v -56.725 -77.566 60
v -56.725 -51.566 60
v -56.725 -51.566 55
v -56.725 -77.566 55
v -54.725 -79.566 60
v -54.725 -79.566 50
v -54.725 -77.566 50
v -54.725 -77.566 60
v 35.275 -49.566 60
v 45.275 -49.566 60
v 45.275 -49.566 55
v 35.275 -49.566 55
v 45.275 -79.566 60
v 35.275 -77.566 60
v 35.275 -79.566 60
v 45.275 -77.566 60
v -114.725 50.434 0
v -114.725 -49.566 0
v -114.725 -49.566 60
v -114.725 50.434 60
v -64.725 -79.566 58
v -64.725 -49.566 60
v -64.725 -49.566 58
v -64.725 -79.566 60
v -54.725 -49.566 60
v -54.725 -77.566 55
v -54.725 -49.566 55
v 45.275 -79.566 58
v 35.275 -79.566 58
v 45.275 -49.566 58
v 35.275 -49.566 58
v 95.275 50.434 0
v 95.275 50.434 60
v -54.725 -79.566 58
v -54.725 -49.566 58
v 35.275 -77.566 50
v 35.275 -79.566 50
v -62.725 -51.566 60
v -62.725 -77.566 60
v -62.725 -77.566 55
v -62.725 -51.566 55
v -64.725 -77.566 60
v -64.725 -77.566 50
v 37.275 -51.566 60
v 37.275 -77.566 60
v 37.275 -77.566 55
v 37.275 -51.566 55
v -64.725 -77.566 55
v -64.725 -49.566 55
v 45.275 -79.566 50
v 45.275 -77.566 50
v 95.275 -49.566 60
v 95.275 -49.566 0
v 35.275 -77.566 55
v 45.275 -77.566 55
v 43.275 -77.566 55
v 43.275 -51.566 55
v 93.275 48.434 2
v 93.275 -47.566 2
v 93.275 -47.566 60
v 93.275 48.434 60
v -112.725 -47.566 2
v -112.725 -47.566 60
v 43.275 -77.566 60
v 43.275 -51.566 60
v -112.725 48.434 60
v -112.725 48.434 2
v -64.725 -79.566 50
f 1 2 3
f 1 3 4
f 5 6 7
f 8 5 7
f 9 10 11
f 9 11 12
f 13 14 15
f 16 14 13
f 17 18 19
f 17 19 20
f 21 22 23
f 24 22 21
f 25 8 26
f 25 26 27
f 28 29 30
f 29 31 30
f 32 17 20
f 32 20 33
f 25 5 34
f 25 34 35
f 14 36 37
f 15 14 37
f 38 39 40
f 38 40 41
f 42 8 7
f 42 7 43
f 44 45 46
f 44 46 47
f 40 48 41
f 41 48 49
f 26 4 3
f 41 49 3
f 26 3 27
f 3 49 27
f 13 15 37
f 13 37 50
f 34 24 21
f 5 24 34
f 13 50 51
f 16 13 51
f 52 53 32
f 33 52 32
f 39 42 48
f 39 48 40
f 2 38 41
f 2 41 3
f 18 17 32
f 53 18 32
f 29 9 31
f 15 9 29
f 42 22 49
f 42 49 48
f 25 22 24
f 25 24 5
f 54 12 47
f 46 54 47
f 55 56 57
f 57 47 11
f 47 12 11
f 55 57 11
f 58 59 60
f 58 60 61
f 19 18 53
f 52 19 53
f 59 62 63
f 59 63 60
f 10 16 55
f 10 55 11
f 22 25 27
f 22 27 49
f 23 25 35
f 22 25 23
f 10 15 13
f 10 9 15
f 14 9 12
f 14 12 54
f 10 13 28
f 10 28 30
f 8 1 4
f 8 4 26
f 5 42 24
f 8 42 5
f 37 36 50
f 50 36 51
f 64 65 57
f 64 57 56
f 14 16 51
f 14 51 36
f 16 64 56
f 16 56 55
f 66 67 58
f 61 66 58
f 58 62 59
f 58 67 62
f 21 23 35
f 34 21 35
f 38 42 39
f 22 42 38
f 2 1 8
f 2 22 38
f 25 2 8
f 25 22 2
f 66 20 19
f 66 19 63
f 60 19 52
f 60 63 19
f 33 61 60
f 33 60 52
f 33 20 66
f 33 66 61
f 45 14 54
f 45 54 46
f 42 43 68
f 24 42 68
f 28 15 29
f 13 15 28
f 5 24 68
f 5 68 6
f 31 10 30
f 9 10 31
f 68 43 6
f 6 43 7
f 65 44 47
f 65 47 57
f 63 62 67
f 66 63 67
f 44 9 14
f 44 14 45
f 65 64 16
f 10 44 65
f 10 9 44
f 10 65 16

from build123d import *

# Parameters (mm, degrees)
F0_W     = 210
F0_H     = 100
F0_W_2   = 206
F0_H_2   = 96
F1_DEPTH = 2
F2_DEPTH = 60
F4_W     = 6
F4_H     = 26
F5_DEPTH = 2
F6_DEPTH = 10
F7_DEPTH = 5


with BuildPart() as f1:
    # F0 (on Top) → F1 (new body)
    with BuildSketch(Plane.XY):
        with Locations((-9.7246277332, 0.4339471459)):
            Rectangle(F0_W, F0_H)
        with Locations((-9.7246277332, 0.4339471459)):
            Rectangle(F0_W_2, F0_H_2, mode=Mode.SUBTRACT)
        with Locations((-9.7246277332, 0.4339471459)):
            Rectangle(F0_W_2, F0_H_2)
    extrude(amount=F1_DEPTH)

    # F0 (on Top) → F2 (join)
    with BuildSketch(Plane.XY):
        with Locations((-9.7246277332, 0.4339471459)):
            Rectangle(F0_W, F0_H)
        with Locations((-9.7246277332, 0.4339471459)):
            Rectangle(F0_W_2, F0_H_2, mode=Mode.SUBTRACT)
    extrude(amount=F2_DEPTH)


with BuildPart() as f5:
    # F4 (on face) → F5 (new body)
    with BuildSketch(Plane.XY.offset(60)):
        Polygon((-54.7246277332, -49.5660528541), (-64.7246277332, -49.5660528541), (-64.7246277332, -77.5660528541), (-62.7246277332, -77.5660528541), (-62.7246277332, -51.5660528541), (-56.7246277332, -51.5660528541), (-56.7246277332, -77.5660528541), (-54.7246277332, -77.5660528541), align=None)
        with Locations((-59.7246277332, -64.5660528541)):
            Rectangle(F4_W, F4_H)
        Polygon((-62.7246277332, -77.5660528541), (-64.7246277332, -77.5660528541), (-64.7246277332, -79.5660528541), (-54.7246277332, -79.5660528541), (-54.7246277332, -77.5660528541), (-56.7246277332, -77.5660528541), align=None)
    extrude(amount=-F5_DEPTH)


with BuildPart() as f5b:
    # F4 (on face) → F5, piece 2 (new body)
    with BuildSketch(Plane.XY.offset(60)):
        Polygon((37.2753722668, -77.5660528541), (35.2753722668, -77.5660528541), (35.2753722668, -79.5660528541), (45.2753722668, -79.5660528541), (45.2753722668, -77.5660528541), (43.2753722668, -77.5660528541), align=None)
        with Locations((40.2753722668, -64.5660528541)):
            Rectangle(F4_W, F4_H)
        Polygon((45.2753722668, -49.5660528541), (35.2753722668, -49.5660528541), (35.2753722668, -77.5660528541), (37.2753722668, -77.5660528541), (37.2753722668, -51.5660528541), (43.2753722668, -51.5660528541), (43.2753722668, -77.5660528541), (45.2753722668, -77.5660528541), align=None)
    extrude(amount=-F5_DEPTH)


with BuildPart() as f6:
    # F4 (on face) → F6 (new body)
    with BuildSketch(Plane.XY.offset(60)):
        Polygon((-62.7246277332, -77.5660528541), (-64.7246277332, -77.5660528541), (-64.7246277332, -79.5660528541), (-54.7246277332, -79.5660528541), (-54.7246277332, -77.5660528541), (-56.7246277332, -77.5660528541), align=None)
    extrude(amount=-F6_DEPTH)


with BuildPart() as f6b:
    # F4 (on face) → F6, piece 2 (new body)
    with BuildSketch(Plane.XY.offset(60)):
        Polygon((37.2753722668, -77.5660528541), (35.2753722668, -77.5660528541), (35.2753722668, -79.5660528541), (45.2753722668, -79.5660528541), (45.2753722668, -77.5660528541), (43.2753722668, -77.5660528541), align=None)
    extrude(amount=-F6_DEPTH)


with BuildPart() as f7:
    # F4 (on face) → F7 (new body)
    with BuildSketch(Plane.XY.offset(60)):
        Polygon((-54.7246277332, -49.5660528541), (-64.7246277332, -49.5660528541), (-64.7246277332, -77.5660528541), (-62.7246277332, -77.5660528541), (-62.7246277332, -51.5660528541), (-56.7246277332, -51.5660528541), (-56.7246277332, -77.5660528541), (-54.7246277332, -77.5660528541), align=None)
    extrude(amount=-F7_DEPTH)


with BuildPart() as f7b:
    # F4 (on face) → F7, piece 2 (new body)
    with BuildSketch(Plane.XY.offset(60)):
        Polygon((45.2753722668, -49.5660528541), (35.2753722668, -49.5660528541), (35.2753722668, -77.5660528541), (37.2753722668, -77.5660528541), (37.2753722668, -51.5660528541), (43.2753722668, -51.5660528541), (43.2753722668, -77.5660528541), (45.2753722668, -77.5660528541), align=None)
    extrude(amount=-F7_DEPTH)


solid = Compound([f1.part, f5.part, f5b.part, f6.part, f6b.part, f7.part, f7b.part])
